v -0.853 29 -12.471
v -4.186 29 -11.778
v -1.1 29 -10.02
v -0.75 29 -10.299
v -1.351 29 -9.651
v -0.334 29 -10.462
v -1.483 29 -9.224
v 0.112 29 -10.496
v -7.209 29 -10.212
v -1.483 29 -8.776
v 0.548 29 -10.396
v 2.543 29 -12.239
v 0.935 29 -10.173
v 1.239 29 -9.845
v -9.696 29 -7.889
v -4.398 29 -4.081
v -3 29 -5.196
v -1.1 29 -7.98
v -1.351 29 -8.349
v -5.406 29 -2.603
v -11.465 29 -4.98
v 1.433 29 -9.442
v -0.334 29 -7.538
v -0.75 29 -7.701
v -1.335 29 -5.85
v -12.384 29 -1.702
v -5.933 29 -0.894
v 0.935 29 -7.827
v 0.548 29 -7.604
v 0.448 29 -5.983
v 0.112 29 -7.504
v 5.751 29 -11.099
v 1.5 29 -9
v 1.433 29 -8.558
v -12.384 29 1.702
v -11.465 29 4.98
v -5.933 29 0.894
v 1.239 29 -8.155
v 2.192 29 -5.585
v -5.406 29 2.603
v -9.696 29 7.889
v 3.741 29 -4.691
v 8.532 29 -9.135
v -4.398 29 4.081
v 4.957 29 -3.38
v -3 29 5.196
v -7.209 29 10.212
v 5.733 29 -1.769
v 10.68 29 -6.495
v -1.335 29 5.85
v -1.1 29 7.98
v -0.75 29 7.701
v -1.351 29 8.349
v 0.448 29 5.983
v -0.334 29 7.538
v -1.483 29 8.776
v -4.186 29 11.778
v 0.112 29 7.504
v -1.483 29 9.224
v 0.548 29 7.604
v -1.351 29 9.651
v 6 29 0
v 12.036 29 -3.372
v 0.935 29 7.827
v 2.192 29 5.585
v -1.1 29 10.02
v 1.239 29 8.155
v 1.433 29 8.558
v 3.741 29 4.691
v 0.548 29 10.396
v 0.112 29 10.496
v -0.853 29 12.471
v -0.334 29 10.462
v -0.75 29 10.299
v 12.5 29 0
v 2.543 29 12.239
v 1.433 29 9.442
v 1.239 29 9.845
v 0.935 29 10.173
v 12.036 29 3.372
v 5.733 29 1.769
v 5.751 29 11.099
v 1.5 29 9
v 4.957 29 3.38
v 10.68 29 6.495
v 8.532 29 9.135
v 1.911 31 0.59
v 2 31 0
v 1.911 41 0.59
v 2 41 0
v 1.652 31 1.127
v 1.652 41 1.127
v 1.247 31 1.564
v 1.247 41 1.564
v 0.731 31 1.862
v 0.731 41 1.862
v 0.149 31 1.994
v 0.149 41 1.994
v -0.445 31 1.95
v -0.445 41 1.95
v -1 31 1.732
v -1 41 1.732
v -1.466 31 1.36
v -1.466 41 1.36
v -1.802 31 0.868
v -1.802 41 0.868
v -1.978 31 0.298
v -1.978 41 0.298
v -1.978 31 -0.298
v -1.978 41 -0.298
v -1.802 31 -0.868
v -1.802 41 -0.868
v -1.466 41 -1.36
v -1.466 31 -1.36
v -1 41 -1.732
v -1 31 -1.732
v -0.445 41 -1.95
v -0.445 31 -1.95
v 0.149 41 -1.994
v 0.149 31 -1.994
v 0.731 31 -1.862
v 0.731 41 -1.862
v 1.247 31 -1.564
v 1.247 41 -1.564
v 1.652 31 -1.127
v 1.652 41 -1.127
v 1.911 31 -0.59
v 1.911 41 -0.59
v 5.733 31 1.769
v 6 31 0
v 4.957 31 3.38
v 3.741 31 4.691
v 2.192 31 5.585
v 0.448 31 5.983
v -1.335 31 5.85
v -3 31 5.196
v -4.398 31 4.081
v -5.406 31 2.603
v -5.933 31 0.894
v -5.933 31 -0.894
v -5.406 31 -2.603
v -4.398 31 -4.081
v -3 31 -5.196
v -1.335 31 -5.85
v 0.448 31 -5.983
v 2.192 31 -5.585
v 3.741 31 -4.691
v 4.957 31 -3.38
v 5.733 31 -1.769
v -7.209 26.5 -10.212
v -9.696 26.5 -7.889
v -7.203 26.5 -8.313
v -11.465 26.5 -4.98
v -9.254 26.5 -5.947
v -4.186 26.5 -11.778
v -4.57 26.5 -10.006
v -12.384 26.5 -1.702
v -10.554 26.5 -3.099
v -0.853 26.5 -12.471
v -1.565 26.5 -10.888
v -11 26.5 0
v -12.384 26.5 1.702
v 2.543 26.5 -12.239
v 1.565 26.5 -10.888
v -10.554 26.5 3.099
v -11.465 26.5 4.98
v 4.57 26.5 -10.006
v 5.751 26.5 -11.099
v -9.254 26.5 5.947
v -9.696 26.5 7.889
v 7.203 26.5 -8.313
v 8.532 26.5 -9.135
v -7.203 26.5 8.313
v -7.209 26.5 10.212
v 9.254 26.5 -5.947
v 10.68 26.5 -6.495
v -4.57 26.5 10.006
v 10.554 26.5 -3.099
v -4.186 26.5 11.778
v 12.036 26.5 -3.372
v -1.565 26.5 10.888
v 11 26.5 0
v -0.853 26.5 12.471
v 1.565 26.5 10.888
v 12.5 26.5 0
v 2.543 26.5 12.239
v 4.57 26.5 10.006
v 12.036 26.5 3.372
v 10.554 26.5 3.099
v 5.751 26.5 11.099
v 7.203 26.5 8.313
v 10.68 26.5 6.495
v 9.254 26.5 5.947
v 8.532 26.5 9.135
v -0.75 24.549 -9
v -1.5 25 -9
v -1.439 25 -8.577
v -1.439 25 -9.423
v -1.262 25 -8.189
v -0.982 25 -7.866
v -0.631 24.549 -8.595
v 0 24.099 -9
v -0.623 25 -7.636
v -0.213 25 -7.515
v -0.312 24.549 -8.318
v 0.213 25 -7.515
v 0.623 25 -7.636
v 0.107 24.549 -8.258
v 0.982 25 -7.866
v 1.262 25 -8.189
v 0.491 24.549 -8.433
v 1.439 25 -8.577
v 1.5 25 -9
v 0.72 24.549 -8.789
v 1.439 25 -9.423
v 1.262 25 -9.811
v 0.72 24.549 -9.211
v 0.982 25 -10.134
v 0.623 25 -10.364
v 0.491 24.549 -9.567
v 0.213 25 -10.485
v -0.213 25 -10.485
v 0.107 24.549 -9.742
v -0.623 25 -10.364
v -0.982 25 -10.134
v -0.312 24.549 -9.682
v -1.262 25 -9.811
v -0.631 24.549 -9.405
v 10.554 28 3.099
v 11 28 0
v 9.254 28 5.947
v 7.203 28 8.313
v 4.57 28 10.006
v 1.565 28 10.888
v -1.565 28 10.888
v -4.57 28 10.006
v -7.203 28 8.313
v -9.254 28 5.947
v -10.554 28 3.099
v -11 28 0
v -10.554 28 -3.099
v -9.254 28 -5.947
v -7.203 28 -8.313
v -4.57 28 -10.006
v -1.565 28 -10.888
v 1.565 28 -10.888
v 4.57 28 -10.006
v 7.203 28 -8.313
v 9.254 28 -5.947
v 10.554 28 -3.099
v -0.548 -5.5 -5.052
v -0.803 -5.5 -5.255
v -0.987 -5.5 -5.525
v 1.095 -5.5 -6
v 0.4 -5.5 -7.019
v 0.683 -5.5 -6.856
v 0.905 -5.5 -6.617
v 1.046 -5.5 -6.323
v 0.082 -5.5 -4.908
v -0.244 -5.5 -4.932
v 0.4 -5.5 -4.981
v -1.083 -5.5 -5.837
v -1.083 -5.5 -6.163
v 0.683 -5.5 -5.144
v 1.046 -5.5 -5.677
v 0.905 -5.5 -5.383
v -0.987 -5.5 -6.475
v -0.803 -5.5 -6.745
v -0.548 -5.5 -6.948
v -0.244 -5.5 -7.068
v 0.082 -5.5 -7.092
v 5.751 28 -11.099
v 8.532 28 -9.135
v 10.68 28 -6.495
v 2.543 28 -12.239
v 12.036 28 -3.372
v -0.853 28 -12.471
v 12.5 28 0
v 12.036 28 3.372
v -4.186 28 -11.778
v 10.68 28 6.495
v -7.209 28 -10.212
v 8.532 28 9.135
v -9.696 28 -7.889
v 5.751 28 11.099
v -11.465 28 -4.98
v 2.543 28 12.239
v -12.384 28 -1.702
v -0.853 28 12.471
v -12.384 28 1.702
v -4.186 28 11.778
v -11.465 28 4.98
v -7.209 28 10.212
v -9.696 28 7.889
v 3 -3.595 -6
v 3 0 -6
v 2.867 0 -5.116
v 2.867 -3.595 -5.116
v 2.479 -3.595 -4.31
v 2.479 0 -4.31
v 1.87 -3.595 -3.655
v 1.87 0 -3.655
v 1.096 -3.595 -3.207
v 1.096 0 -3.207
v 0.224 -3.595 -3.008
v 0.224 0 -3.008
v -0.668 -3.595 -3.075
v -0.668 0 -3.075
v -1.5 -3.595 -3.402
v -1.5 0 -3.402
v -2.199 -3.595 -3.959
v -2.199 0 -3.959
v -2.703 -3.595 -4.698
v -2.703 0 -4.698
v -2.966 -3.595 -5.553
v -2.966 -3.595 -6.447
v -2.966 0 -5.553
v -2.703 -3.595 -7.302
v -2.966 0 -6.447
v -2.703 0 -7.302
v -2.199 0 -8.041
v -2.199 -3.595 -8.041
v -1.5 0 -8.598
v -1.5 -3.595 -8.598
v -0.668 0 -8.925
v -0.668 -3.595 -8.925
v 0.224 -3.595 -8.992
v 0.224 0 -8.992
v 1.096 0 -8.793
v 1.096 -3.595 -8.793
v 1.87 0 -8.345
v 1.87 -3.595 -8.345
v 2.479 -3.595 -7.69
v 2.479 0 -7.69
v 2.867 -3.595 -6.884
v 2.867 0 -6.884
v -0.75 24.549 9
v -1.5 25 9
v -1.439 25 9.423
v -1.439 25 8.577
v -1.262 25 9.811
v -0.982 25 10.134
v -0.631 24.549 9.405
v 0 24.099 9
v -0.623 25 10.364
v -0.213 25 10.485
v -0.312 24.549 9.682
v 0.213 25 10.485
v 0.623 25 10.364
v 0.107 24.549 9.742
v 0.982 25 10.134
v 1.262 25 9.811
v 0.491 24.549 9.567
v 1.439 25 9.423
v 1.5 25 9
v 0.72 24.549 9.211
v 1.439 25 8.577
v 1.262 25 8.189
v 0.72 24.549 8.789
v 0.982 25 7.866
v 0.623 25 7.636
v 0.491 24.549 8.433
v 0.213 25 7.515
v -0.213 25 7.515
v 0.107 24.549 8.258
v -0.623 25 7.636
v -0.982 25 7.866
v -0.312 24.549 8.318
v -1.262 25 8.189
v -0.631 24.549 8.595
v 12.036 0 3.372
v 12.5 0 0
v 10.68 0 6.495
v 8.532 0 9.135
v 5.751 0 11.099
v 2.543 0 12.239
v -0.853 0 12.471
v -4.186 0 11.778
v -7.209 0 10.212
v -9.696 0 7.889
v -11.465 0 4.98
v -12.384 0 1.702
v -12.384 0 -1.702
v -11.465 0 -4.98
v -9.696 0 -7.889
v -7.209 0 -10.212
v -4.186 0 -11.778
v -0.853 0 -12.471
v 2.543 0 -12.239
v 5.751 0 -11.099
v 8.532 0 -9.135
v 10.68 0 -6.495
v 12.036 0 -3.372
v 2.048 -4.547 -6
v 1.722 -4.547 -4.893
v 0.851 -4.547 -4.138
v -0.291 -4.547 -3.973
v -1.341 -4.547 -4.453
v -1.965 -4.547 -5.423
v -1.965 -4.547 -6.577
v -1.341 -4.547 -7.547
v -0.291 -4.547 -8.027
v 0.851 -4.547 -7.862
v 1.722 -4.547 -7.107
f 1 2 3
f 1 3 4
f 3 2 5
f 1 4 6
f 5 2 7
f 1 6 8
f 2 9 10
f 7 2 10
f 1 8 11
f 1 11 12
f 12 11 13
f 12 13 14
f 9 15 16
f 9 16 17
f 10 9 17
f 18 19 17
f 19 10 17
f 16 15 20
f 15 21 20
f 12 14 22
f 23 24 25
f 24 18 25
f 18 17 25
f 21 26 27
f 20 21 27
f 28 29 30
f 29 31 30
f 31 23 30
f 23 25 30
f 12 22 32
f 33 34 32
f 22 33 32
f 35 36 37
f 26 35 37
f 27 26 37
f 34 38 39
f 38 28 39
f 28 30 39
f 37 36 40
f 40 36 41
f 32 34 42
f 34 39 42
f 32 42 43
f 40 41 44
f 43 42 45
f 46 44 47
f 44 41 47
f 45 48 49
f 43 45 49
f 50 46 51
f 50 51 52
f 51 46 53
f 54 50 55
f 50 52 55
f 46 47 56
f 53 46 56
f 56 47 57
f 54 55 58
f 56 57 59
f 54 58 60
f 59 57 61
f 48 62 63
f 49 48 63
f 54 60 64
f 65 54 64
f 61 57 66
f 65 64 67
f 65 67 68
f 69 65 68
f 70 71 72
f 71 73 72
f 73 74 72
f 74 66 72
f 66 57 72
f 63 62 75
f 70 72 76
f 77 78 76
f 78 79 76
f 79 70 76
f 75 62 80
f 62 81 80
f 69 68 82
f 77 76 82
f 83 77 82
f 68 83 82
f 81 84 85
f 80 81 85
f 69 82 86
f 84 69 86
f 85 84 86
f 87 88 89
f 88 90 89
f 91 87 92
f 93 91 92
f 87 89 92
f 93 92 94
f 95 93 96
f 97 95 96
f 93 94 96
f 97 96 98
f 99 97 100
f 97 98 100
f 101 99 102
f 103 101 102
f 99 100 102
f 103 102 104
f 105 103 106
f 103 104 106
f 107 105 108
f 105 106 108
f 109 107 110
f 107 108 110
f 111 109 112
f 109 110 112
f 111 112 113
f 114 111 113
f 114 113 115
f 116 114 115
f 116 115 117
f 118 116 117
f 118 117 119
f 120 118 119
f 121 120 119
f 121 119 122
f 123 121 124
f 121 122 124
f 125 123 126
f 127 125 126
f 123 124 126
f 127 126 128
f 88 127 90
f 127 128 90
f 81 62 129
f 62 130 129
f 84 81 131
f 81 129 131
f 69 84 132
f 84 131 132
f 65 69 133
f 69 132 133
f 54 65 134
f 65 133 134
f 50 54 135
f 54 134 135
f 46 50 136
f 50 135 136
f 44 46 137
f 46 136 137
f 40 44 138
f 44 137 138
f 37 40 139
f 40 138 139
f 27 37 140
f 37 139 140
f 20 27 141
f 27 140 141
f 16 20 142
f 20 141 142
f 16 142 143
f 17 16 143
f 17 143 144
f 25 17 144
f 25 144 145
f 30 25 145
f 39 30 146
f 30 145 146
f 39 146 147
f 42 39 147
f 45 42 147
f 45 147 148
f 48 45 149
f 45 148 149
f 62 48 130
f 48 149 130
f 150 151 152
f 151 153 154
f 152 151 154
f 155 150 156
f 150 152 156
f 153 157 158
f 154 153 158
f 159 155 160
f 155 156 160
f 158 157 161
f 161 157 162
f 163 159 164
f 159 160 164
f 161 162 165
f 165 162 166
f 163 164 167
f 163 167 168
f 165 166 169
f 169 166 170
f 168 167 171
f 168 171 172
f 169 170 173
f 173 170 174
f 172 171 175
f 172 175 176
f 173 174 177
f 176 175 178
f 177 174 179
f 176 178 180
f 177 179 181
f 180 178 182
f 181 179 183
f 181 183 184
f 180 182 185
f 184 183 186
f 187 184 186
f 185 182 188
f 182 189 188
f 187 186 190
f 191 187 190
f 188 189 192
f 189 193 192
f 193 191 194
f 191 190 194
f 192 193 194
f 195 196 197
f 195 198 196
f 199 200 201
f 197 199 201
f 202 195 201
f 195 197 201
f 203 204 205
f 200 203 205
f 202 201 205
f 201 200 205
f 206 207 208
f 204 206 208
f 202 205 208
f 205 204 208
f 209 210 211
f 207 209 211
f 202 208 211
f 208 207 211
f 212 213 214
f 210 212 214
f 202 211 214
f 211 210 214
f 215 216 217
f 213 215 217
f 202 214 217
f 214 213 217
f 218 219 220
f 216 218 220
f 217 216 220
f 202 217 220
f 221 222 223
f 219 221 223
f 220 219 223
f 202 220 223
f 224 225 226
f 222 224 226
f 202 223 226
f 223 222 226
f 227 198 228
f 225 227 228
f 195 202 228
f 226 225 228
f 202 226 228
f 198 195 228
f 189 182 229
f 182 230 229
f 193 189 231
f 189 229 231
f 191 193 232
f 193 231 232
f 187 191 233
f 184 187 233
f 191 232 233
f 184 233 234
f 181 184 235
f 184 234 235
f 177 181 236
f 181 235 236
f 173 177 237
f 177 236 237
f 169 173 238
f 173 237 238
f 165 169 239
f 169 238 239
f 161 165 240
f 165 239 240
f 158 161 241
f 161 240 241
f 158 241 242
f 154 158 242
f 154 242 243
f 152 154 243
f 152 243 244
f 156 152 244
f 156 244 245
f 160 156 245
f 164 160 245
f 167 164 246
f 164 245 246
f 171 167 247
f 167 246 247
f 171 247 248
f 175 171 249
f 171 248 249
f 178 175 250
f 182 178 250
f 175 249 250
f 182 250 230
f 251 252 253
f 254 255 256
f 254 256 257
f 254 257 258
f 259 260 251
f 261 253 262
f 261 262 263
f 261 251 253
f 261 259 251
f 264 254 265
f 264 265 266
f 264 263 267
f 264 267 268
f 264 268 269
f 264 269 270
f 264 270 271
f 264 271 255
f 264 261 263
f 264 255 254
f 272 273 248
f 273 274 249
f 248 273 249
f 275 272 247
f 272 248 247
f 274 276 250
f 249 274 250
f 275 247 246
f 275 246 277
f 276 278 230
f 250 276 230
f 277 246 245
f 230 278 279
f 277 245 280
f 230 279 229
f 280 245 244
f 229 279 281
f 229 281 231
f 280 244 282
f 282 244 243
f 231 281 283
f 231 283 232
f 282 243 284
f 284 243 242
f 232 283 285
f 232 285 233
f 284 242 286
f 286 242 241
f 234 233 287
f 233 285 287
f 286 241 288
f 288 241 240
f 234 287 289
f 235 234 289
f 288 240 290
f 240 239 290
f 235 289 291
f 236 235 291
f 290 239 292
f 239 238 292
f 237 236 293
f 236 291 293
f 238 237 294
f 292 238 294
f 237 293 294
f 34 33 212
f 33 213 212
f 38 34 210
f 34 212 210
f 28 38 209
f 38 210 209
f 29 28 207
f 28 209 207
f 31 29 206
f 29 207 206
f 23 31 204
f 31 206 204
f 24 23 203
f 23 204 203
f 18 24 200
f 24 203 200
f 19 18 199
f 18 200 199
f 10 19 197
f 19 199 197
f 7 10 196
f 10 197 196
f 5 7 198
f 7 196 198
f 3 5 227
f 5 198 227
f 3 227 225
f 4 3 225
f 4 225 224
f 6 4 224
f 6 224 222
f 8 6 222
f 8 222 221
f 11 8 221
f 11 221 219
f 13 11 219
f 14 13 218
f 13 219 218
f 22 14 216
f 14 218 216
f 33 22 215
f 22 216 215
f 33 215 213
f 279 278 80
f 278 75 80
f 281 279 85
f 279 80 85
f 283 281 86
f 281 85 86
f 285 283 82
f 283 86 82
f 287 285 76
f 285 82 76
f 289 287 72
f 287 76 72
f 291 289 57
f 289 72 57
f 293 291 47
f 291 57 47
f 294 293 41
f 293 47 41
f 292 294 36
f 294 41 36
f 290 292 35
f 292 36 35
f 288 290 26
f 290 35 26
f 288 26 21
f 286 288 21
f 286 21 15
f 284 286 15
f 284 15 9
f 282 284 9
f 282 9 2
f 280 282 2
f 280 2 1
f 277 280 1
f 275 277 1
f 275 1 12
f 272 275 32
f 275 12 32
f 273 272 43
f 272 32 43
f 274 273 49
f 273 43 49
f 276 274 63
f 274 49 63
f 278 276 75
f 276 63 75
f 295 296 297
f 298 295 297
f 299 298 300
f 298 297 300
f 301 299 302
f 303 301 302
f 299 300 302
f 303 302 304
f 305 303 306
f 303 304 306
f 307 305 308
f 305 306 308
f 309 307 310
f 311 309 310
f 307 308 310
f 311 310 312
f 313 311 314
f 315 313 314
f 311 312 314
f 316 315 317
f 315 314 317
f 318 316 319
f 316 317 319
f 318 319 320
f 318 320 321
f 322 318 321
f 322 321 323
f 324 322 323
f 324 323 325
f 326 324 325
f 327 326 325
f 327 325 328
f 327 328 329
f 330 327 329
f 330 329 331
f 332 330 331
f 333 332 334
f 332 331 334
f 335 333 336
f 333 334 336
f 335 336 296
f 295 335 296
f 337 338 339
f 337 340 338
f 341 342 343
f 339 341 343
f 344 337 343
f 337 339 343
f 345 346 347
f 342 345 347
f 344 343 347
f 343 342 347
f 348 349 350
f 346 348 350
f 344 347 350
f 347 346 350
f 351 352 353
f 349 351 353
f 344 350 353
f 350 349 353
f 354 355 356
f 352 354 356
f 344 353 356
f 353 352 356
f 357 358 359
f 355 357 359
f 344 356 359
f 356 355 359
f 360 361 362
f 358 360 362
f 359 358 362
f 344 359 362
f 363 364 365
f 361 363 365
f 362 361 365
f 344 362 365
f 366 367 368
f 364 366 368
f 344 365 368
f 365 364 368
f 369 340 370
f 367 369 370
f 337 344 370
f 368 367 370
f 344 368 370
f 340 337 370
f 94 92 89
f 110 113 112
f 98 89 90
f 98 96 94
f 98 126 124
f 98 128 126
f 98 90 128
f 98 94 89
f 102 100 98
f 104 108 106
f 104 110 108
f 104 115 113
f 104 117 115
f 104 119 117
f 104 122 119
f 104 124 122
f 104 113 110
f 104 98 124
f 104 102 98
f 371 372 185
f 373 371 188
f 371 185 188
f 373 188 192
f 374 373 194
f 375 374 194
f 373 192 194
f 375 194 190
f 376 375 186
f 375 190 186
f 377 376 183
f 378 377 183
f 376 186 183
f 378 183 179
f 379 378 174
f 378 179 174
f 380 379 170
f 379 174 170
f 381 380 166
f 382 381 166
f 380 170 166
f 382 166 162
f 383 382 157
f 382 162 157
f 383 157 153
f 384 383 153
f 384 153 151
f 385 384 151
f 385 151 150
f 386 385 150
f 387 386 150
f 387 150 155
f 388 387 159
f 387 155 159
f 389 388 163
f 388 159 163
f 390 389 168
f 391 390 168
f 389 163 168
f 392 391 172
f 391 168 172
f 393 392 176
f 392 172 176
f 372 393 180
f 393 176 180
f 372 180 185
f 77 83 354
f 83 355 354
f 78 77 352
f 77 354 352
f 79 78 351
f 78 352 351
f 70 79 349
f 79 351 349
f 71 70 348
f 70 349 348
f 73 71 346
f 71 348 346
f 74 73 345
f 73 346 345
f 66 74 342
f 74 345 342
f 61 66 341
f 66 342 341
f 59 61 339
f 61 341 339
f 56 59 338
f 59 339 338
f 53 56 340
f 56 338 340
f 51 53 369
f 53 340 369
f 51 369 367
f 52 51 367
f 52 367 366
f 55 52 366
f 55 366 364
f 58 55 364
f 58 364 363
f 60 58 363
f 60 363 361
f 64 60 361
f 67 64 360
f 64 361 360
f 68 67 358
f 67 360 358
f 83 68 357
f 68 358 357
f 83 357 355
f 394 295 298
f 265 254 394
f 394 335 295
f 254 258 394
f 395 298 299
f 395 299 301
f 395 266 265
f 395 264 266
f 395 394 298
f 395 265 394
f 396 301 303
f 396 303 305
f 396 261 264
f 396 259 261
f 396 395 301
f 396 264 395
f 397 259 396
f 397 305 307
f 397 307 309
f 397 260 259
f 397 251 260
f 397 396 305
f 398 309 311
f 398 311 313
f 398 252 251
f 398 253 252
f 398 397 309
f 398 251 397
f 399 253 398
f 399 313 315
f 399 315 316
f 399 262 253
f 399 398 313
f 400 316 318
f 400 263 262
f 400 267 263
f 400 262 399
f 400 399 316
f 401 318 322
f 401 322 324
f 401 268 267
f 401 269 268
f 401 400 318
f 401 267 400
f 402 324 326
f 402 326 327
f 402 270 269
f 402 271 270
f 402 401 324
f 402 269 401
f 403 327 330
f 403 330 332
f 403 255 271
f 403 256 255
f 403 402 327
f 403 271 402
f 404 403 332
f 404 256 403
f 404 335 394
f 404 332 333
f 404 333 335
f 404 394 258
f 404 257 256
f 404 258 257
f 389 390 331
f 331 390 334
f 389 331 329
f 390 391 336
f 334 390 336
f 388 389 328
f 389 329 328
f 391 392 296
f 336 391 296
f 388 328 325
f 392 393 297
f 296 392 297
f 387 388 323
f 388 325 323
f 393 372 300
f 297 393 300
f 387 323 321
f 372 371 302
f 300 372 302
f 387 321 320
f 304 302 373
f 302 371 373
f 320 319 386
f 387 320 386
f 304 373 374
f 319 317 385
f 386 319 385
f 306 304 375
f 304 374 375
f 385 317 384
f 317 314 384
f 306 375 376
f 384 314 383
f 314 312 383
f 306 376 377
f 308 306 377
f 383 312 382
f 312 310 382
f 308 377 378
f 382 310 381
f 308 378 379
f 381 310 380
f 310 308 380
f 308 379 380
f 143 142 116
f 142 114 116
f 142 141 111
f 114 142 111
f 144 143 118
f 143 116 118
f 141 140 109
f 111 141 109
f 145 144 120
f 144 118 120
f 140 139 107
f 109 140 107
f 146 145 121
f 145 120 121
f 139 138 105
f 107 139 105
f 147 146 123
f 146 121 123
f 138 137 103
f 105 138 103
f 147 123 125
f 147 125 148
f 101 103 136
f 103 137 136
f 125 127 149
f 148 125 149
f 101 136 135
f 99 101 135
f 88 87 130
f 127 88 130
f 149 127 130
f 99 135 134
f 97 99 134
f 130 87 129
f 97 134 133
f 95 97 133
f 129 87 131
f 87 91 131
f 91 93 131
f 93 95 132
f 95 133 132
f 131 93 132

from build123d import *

# Parameters (mm, degrees)
F0_W     = 2
F0_H     = 10
F3_D     = 3
F3_DEPTH = 4
F3_TIP   = 0.9012909285
F4_R     = 3
F5_DEPTH = 5.5
F6_SIZE  = 1.905


with BuildPart() as f1:
    # F0 (on Top) → F1 (revolve)
    with BuildSketch(Plane.XY):
        Polygon((6, 29), (0, 29), (0, 0), (12.5, 0), (12.5, 26.5), (11, 26.5), (11, 28), (12.5, 28), (12.5, 29), align=None)
        Polygon((0, 31), (0, 29), (6, 29), (6, 31), (2, 31), align=None)
        with Locations((1, 36)):
            Rectangle(F0_W, F0_H)
    revolve(axis=Axis((0, 14.5, 0), (0, -1, 0)))

    # F3
    with Locations(Plane(origin=(0, 29, 0), x_dir=(-1, 0, 0), z_dir=(0, 1, 0))):
        with Locations((0, 9), (0, -9)):
            Hole(F3_D / 2, depth=F3_DEPTH)
            with Locations((0, 0, -(F3_DEPTH + F3_TIP / 2))):  # 118° drill point
                Cone(0, F3_D / 2, F3_TIP, mode=Mode.SUBTRACT)

    # F4 (on face) → F5 (join)
    with BuildSketch(Plane.XZ):
        with Locations((0, -6)):
            Circle(F4_R)
    extrude(amount=F5_DEPTH)

    # F6
    f6_edges = [f1.edges().sort_by_distance(p)[0] for p in [
        (-3, -5.5, -6),
    ]]
    chamfer(f6_edges, length=F6_SIZE)


solid = f1.part
